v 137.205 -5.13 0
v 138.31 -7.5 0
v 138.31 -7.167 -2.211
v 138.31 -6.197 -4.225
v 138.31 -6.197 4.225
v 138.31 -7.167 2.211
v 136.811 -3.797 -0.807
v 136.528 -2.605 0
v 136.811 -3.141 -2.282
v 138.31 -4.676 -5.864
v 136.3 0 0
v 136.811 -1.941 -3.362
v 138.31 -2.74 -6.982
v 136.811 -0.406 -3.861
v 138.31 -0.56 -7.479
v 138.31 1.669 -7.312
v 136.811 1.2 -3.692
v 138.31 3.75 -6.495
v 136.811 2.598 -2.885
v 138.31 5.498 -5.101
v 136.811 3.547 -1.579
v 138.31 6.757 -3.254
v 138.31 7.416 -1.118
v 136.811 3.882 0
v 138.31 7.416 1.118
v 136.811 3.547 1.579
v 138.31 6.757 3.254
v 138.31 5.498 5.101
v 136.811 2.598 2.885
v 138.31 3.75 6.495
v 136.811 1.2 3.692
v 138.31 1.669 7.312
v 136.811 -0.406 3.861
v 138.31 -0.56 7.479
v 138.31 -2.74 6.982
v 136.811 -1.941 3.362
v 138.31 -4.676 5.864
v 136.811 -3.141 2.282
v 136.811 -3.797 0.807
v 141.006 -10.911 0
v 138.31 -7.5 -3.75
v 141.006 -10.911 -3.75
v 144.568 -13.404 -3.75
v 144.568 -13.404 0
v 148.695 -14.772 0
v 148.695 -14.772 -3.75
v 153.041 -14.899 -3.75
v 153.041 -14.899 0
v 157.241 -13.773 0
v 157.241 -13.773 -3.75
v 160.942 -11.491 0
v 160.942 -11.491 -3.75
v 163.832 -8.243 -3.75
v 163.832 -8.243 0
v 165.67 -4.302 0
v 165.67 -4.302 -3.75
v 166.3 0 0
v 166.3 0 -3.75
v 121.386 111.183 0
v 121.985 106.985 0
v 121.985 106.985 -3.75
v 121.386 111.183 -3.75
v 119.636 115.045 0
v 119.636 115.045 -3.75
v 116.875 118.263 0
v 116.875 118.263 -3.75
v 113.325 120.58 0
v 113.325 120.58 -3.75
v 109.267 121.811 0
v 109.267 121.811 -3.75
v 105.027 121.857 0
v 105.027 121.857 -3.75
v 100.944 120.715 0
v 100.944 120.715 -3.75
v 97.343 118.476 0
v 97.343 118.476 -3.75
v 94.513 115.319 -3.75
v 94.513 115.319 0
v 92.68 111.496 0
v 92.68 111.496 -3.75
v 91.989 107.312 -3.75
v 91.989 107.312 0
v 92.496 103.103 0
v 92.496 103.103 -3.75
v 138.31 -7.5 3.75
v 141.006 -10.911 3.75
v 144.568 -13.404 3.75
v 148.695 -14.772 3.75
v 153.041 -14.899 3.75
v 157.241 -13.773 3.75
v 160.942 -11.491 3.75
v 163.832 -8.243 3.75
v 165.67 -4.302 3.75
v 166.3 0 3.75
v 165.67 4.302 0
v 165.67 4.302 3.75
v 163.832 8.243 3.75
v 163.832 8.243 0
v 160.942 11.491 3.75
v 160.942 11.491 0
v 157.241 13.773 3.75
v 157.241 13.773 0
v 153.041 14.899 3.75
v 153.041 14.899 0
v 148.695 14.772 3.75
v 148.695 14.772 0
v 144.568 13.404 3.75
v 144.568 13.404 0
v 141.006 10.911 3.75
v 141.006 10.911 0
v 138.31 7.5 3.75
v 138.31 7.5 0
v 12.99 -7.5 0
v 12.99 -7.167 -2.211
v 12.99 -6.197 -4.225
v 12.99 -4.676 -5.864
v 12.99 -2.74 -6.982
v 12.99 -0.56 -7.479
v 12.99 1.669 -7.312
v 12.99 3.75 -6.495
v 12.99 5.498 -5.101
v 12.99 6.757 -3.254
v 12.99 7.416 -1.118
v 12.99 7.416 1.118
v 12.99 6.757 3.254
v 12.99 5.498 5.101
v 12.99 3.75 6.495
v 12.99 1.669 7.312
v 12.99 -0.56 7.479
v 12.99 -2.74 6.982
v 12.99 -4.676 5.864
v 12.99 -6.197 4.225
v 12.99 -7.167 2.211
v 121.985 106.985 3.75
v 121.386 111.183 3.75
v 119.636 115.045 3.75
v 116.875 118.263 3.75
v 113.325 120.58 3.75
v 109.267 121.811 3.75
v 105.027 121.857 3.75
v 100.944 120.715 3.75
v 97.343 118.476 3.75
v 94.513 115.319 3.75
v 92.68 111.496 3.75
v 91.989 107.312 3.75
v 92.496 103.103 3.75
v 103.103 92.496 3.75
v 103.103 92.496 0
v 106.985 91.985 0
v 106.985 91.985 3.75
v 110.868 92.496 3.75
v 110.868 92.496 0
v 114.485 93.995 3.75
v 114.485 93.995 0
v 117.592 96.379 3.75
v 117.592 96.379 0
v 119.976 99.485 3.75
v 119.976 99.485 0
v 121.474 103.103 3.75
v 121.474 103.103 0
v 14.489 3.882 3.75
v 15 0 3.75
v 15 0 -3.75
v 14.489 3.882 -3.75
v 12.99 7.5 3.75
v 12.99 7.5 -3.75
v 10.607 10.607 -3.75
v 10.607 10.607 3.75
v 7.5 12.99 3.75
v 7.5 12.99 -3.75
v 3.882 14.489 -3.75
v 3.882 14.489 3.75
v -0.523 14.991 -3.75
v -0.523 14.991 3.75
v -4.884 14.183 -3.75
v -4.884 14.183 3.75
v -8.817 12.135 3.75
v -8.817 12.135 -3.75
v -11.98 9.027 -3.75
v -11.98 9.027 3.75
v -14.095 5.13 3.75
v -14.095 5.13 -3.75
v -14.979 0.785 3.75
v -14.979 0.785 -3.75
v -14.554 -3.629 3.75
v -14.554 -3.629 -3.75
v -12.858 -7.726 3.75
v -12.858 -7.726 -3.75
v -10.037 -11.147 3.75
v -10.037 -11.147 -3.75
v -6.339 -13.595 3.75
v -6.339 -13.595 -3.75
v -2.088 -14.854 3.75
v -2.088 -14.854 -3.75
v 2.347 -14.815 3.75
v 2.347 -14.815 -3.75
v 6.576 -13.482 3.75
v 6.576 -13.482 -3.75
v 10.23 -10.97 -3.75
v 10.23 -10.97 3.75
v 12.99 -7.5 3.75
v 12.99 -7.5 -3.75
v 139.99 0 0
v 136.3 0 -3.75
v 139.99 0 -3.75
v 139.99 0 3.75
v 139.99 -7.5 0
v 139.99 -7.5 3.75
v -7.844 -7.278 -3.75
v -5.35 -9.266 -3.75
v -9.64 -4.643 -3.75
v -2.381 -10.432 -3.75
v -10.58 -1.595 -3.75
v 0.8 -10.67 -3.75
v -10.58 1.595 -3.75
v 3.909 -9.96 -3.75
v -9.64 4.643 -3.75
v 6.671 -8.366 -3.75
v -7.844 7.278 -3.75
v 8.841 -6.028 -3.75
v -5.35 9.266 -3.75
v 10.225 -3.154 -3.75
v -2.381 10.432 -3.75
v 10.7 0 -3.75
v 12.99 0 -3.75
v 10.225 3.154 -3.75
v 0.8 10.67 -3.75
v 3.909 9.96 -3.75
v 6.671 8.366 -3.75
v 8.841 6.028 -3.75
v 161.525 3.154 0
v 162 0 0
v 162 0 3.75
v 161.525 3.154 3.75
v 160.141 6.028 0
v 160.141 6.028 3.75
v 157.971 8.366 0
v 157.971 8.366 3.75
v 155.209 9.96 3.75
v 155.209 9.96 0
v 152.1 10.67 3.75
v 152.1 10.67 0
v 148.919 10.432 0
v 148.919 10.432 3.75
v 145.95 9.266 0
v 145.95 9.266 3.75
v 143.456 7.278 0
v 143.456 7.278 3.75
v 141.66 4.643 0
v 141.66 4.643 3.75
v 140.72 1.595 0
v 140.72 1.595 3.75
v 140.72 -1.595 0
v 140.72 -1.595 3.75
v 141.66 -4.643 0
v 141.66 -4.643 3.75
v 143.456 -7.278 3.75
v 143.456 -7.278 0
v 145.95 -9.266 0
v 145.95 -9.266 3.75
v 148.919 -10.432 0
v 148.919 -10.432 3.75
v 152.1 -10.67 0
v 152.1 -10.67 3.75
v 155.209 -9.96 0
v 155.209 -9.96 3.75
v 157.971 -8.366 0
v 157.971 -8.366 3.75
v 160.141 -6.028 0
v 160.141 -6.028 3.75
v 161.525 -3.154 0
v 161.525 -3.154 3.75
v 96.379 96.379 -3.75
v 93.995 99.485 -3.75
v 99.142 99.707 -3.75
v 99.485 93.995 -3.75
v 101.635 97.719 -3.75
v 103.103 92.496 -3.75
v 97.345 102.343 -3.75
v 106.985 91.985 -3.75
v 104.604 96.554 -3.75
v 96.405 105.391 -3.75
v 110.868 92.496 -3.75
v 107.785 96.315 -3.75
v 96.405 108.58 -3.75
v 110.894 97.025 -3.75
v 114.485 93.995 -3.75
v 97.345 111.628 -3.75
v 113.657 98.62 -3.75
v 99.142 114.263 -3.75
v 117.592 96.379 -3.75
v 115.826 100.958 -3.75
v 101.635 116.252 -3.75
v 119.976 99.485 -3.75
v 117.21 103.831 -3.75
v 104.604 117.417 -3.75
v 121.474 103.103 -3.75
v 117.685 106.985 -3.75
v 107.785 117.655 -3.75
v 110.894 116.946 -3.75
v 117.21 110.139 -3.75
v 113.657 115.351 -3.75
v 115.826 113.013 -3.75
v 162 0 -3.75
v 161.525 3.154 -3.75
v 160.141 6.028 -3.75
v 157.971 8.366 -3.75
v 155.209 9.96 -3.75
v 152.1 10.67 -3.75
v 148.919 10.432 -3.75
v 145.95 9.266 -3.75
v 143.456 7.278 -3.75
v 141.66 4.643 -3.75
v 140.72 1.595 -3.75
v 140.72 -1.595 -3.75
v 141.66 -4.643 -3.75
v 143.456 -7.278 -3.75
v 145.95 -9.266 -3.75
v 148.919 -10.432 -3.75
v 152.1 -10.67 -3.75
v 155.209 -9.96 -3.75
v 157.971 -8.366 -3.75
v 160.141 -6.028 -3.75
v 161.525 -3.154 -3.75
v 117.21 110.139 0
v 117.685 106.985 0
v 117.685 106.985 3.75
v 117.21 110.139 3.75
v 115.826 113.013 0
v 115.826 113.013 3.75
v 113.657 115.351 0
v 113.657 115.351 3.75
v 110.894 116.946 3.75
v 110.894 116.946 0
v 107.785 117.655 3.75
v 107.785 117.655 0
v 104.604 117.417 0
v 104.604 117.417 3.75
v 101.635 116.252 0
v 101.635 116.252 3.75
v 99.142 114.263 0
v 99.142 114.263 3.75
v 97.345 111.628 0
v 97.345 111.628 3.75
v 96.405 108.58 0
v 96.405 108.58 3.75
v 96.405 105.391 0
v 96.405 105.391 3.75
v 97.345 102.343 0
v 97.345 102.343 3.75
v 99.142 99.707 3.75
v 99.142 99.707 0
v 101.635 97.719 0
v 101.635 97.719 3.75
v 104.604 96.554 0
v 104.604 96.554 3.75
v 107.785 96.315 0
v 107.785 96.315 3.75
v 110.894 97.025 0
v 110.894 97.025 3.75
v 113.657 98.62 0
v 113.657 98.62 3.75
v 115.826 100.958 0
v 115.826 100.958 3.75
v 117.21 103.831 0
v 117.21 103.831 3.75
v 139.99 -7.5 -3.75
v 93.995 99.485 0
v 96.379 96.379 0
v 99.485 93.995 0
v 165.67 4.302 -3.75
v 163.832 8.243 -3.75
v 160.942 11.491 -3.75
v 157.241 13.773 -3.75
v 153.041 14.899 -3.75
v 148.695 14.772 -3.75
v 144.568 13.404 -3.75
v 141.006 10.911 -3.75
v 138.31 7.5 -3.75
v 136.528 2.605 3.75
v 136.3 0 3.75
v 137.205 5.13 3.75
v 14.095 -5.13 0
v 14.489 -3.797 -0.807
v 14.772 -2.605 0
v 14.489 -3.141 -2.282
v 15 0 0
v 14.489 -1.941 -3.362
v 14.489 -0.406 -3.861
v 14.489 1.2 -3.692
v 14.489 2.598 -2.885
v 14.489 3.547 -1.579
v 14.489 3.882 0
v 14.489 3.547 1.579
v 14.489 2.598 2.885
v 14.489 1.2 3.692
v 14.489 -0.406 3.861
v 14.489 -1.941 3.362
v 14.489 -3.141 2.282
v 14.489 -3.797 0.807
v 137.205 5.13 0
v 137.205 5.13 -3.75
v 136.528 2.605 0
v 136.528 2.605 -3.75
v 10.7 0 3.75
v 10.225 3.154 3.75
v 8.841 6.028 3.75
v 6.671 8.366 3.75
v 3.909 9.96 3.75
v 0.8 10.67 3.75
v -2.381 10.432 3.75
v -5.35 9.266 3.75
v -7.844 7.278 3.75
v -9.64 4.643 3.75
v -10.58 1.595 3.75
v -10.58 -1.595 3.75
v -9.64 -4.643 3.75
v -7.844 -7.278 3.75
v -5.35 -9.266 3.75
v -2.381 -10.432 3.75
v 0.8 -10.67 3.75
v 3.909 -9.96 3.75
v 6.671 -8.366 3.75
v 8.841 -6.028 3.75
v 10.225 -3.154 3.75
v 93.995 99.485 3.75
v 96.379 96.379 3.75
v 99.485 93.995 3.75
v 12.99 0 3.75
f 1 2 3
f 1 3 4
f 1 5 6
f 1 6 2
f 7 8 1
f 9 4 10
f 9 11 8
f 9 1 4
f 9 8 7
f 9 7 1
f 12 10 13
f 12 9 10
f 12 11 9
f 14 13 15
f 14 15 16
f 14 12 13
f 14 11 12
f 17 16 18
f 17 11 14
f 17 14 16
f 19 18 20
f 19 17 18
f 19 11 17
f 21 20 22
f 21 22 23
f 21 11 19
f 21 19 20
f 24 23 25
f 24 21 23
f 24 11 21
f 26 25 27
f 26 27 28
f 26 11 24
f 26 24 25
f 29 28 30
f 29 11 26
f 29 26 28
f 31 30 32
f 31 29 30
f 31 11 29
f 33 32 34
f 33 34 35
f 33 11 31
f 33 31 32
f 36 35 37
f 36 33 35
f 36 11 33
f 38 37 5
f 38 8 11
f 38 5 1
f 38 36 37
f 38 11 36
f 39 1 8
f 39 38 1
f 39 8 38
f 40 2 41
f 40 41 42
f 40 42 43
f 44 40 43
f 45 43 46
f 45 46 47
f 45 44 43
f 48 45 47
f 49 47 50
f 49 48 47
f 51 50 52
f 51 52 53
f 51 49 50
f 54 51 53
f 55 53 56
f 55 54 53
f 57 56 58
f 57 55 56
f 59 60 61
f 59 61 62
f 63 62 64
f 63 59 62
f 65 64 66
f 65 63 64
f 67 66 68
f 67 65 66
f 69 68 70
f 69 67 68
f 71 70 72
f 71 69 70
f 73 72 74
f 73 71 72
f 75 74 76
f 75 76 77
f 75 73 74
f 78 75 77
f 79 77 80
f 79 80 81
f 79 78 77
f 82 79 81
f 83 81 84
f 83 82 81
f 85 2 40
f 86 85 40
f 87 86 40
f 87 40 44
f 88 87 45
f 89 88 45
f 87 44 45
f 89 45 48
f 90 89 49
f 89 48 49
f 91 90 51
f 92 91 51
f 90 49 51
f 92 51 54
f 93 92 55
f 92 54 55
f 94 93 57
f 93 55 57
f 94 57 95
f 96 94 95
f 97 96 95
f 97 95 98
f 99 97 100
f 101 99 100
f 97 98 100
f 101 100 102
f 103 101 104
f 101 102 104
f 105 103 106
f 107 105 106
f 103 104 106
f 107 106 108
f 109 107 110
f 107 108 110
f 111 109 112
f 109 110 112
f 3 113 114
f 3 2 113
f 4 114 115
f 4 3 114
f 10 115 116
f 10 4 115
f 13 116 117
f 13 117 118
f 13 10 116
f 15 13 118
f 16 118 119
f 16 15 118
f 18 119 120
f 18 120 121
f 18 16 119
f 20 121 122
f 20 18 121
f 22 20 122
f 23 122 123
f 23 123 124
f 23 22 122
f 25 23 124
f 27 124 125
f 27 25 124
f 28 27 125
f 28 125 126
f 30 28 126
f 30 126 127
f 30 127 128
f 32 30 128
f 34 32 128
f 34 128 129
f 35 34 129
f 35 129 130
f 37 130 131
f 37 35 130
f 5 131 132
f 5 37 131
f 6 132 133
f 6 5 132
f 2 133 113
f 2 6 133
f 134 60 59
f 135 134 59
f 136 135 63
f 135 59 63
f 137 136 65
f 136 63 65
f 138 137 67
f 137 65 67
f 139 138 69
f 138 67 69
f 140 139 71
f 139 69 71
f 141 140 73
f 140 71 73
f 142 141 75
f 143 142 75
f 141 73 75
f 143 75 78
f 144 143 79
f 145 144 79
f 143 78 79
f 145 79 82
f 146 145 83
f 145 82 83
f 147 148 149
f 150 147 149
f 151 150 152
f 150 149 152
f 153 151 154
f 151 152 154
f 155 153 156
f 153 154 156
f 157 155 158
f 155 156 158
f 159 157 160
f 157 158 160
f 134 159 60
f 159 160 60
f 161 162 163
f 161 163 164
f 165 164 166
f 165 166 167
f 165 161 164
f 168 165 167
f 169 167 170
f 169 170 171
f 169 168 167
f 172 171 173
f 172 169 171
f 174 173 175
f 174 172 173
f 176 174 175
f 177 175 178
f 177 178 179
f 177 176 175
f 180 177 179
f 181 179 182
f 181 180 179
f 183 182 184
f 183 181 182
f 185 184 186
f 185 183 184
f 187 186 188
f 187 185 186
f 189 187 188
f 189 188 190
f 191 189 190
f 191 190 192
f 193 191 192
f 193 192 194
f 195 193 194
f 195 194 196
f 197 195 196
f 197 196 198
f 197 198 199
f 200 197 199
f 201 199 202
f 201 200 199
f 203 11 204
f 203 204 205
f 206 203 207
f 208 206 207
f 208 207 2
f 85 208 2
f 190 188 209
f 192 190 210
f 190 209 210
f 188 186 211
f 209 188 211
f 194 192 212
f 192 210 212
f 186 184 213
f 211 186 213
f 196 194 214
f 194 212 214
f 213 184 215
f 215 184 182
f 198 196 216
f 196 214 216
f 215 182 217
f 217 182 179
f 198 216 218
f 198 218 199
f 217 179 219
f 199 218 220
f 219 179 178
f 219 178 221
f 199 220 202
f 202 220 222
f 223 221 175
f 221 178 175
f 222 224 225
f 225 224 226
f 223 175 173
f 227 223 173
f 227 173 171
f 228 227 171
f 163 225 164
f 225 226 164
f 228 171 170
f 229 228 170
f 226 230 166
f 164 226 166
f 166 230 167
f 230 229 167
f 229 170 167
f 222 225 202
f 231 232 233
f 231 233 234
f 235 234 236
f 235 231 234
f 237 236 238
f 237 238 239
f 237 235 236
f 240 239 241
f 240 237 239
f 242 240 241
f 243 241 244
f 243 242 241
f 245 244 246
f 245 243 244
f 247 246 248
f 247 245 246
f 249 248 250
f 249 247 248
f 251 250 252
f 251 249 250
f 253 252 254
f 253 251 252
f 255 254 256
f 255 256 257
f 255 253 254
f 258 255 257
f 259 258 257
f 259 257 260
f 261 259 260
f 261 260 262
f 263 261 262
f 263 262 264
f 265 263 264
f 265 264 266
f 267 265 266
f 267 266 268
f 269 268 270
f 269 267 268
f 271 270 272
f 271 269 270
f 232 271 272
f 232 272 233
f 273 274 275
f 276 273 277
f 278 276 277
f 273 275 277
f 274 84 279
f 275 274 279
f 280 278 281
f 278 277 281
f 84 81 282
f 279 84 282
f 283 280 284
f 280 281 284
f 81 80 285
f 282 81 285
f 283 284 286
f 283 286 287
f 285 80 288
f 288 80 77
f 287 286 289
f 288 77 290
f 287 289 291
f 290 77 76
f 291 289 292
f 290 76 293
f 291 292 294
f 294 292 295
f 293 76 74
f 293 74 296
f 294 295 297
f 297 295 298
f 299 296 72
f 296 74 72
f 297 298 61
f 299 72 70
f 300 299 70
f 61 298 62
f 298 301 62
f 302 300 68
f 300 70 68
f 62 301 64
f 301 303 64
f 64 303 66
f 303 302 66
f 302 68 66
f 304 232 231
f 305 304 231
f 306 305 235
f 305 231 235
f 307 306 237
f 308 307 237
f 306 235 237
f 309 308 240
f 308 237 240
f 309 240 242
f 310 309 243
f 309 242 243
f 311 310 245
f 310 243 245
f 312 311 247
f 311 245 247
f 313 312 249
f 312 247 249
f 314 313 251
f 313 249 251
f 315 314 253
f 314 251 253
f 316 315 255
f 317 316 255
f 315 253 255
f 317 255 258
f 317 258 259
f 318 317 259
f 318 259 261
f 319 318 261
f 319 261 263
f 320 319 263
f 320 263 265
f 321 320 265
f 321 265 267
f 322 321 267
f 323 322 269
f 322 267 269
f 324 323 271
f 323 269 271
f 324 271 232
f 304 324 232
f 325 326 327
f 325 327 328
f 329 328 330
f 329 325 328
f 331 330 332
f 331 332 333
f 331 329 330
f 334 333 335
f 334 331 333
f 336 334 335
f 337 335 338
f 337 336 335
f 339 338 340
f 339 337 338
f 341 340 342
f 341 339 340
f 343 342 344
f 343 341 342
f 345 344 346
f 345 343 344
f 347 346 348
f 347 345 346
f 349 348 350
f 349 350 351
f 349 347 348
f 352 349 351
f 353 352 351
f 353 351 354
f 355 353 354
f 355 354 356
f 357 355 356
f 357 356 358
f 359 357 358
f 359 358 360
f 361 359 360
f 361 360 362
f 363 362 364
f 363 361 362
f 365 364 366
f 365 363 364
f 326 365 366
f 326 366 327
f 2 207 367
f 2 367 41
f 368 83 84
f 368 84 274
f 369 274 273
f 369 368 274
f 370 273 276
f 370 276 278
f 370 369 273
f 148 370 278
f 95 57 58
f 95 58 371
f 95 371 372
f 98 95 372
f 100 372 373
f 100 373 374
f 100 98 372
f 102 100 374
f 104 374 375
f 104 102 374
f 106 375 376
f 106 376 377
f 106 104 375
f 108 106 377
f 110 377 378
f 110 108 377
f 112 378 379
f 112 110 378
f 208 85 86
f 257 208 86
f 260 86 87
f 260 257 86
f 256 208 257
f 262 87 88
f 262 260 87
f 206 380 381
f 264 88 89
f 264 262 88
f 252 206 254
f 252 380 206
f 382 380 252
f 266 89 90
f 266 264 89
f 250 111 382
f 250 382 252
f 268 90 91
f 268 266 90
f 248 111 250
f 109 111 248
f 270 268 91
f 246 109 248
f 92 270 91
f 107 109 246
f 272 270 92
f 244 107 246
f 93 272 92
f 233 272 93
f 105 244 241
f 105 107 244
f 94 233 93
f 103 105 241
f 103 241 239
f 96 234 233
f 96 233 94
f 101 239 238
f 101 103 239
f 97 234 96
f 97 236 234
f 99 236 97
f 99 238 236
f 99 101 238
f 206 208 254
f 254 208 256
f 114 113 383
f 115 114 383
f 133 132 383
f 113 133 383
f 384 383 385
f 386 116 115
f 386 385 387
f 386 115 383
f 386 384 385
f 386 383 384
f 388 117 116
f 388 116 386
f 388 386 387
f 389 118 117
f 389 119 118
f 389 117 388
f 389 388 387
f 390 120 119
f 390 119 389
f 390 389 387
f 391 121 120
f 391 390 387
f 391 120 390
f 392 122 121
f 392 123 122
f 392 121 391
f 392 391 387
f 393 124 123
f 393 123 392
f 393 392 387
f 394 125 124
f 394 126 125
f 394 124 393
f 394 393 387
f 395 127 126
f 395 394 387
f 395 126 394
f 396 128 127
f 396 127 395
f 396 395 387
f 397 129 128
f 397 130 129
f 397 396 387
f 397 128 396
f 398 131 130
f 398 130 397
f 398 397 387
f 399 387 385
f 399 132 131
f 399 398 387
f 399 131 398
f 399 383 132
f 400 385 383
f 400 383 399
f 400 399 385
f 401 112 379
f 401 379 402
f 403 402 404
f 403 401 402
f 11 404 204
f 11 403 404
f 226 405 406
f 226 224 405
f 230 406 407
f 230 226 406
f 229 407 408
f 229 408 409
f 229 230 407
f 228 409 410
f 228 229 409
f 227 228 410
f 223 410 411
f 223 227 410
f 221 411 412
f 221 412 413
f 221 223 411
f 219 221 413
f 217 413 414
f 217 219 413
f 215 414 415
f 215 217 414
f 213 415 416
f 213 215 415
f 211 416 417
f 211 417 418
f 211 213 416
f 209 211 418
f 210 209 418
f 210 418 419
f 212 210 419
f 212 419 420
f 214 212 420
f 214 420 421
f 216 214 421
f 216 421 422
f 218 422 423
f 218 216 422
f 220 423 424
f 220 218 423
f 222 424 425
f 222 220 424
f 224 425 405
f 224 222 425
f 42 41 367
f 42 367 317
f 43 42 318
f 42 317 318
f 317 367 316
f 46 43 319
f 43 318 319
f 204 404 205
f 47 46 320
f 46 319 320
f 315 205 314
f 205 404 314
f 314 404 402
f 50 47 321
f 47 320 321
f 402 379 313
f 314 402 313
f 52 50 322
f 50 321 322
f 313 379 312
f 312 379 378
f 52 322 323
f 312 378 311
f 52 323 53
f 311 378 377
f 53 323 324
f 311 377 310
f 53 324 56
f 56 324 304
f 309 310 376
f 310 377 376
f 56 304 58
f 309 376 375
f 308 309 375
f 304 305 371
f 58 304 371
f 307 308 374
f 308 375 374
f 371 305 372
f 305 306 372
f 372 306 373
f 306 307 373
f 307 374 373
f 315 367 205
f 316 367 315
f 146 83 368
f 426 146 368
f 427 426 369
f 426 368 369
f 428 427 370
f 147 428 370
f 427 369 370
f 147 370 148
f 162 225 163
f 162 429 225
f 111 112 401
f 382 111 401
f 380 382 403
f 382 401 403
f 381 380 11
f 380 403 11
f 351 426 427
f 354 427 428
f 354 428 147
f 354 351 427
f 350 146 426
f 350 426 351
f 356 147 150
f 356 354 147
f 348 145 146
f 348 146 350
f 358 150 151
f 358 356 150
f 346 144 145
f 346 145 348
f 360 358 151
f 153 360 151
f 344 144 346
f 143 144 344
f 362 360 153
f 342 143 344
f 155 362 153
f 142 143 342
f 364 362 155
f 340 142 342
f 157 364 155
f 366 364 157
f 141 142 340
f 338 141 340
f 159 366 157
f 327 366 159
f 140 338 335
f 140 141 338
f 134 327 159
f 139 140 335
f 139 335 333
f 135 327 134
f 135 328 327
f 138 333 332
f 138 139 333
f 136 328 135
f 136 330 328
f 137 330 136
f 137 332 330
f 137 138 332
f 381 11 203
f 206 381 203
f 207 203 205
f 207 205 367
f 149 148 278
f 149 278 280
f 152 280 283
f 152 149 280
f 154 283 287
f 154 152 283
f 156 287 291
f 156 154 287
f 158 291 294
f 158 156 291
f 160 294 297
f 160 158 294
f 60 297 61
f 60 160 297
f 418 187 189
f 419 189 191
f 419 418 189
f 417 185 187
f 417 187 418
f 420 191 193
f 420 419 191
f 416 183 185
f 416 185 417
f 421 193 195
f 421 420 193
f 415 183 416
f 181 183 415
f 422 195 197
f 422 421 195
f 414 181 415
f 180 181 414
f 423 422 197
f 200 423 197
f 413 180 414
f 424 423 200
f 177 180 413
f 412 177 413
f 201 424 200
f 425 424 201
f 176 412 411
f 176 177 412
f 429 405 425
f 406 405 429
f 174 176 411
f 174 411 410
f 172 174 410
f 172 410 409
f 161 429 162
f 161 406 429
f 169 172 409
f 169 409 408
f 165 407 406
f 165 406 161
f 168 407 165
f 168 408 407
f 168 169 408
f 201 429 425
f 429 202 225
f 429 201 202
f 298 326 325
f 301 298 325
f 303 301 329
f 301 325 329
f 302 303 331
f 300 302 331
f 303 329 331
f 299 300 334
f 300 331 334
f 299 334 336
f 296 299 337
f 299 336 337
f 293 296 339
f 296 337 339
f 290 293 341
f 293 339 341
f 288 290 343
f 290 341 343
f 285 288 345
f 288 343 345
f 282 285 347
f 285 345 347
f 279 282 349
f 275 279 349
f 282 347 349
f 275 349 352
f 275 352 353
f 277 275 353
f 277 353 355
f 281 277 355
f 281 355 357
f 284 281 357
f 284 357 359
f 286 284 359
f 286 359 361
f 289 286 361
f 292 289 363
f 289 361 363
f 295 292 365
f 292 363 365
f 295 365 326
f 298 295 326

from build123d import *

# Parameters (mm, degrees)
F0_R     = 10.7
F1_DEPTH = 3.75


with BuildPart() as f1:
    # F0 (on Top) → F1 (new body, symmetric)
    with BuildSketch(Plane.XY):
        with BuildLine():
            Line((12.9903810568, 0), (15, 0))
            ThreePointArc((15, 0), (11.9003001044, 9.1314214351), (3.8822856765, 14.4888873943))
            ThreePointArc((3.8822856765, 14.4888873943), (-13.8581929877, -5.7402514855), (12.9903810568, -7.5))
            Line((12.9903810568, -7.5), (12.9903810568, 0))
        make_face()
        Circle(F0_R, mode=Mode.SUBTRACT)
    extrude(amount=F1_DEPTH, both=True)


with BuildPart() as f1b:
    # F0 (on Top) → F1, piece 2 (new body, symmetric)
    with BuildSketch(Plane.XY):
        with BuildLine():
            ThreePointArc((138.3096189432, 7.5), (136.8111126057, 3.8822856765), (136.3, 0))
            Line((136.3, 0), (139.9895697832, 0))
            Line((139.9895697832, 0), (139.9895697832, -7.5))
            Line((139.9895697832, -7.5), (138.3096189432, -7.5))
            ThreePointArc((138.3096189432, -7.5), (155.1822856765, -14.4888873943), (166.3, 0))
            ThreePointArc((166.3, 0), (155.1822856765, 14.4888873943), (138.3096189432, 7.5))
        make_face()
        with Locations((151.3, 0)):
            Circle(F0_R, mode=Mode.SUBTRACT)
    extrude(amount=F1_DEPTH, both=True)


with BuildPart() as f1c:
    # F0 (on Top) → F1, piece 3 (new body, symmetric)
    with BuildSketch(Plane.XY):
        with BuildLine():
            ThreePointArc((121.9852559935, 106.9852559935), (105.0273631102, 121.8569289141), (92.4963685992, 103.102970317))
            ThreePointArc((92.4963685992, 103.102970317), (96.3786542757, 96.3786542757), (103.102970317, 92.4963685992))
            ThreePointArc((103.102970317, 92.4963685992), (116.1166774287, 95.0849558892), (121.9852559935, 106.9852559935))
        make_face()
        with Locations((106.9852559935, 106.9852559935)):
            Circle(F0_R, mode=Mode.SUBTRACT)
    extrude(amount=F1_DEPTH, both=True)


with BuildPart() as f2:
    # F0 (on Top) → F2 (revolve)
    with BuildSketch(Plane.XY):
        with BuildLine():
            Line((136.3, 0), (15, 0))
            ThreePointArc((15, 0), (14.4888873943, -3.8822856765), (12.9903810568, -7.5))
            Line((12.9903810568, -7.5), (138.3096189432, -7.5))
            ThreePointArc((138.3096189432, -7.5), (136.8111126057, -3.8822856765), (136.3, 0))
        make_face()
    revolve(axis=Axis((76.48997542, 0, 0), (1, 0, 0)))


solid = Compound([f1.part, f1b.part, f1c.part, f2.part])
